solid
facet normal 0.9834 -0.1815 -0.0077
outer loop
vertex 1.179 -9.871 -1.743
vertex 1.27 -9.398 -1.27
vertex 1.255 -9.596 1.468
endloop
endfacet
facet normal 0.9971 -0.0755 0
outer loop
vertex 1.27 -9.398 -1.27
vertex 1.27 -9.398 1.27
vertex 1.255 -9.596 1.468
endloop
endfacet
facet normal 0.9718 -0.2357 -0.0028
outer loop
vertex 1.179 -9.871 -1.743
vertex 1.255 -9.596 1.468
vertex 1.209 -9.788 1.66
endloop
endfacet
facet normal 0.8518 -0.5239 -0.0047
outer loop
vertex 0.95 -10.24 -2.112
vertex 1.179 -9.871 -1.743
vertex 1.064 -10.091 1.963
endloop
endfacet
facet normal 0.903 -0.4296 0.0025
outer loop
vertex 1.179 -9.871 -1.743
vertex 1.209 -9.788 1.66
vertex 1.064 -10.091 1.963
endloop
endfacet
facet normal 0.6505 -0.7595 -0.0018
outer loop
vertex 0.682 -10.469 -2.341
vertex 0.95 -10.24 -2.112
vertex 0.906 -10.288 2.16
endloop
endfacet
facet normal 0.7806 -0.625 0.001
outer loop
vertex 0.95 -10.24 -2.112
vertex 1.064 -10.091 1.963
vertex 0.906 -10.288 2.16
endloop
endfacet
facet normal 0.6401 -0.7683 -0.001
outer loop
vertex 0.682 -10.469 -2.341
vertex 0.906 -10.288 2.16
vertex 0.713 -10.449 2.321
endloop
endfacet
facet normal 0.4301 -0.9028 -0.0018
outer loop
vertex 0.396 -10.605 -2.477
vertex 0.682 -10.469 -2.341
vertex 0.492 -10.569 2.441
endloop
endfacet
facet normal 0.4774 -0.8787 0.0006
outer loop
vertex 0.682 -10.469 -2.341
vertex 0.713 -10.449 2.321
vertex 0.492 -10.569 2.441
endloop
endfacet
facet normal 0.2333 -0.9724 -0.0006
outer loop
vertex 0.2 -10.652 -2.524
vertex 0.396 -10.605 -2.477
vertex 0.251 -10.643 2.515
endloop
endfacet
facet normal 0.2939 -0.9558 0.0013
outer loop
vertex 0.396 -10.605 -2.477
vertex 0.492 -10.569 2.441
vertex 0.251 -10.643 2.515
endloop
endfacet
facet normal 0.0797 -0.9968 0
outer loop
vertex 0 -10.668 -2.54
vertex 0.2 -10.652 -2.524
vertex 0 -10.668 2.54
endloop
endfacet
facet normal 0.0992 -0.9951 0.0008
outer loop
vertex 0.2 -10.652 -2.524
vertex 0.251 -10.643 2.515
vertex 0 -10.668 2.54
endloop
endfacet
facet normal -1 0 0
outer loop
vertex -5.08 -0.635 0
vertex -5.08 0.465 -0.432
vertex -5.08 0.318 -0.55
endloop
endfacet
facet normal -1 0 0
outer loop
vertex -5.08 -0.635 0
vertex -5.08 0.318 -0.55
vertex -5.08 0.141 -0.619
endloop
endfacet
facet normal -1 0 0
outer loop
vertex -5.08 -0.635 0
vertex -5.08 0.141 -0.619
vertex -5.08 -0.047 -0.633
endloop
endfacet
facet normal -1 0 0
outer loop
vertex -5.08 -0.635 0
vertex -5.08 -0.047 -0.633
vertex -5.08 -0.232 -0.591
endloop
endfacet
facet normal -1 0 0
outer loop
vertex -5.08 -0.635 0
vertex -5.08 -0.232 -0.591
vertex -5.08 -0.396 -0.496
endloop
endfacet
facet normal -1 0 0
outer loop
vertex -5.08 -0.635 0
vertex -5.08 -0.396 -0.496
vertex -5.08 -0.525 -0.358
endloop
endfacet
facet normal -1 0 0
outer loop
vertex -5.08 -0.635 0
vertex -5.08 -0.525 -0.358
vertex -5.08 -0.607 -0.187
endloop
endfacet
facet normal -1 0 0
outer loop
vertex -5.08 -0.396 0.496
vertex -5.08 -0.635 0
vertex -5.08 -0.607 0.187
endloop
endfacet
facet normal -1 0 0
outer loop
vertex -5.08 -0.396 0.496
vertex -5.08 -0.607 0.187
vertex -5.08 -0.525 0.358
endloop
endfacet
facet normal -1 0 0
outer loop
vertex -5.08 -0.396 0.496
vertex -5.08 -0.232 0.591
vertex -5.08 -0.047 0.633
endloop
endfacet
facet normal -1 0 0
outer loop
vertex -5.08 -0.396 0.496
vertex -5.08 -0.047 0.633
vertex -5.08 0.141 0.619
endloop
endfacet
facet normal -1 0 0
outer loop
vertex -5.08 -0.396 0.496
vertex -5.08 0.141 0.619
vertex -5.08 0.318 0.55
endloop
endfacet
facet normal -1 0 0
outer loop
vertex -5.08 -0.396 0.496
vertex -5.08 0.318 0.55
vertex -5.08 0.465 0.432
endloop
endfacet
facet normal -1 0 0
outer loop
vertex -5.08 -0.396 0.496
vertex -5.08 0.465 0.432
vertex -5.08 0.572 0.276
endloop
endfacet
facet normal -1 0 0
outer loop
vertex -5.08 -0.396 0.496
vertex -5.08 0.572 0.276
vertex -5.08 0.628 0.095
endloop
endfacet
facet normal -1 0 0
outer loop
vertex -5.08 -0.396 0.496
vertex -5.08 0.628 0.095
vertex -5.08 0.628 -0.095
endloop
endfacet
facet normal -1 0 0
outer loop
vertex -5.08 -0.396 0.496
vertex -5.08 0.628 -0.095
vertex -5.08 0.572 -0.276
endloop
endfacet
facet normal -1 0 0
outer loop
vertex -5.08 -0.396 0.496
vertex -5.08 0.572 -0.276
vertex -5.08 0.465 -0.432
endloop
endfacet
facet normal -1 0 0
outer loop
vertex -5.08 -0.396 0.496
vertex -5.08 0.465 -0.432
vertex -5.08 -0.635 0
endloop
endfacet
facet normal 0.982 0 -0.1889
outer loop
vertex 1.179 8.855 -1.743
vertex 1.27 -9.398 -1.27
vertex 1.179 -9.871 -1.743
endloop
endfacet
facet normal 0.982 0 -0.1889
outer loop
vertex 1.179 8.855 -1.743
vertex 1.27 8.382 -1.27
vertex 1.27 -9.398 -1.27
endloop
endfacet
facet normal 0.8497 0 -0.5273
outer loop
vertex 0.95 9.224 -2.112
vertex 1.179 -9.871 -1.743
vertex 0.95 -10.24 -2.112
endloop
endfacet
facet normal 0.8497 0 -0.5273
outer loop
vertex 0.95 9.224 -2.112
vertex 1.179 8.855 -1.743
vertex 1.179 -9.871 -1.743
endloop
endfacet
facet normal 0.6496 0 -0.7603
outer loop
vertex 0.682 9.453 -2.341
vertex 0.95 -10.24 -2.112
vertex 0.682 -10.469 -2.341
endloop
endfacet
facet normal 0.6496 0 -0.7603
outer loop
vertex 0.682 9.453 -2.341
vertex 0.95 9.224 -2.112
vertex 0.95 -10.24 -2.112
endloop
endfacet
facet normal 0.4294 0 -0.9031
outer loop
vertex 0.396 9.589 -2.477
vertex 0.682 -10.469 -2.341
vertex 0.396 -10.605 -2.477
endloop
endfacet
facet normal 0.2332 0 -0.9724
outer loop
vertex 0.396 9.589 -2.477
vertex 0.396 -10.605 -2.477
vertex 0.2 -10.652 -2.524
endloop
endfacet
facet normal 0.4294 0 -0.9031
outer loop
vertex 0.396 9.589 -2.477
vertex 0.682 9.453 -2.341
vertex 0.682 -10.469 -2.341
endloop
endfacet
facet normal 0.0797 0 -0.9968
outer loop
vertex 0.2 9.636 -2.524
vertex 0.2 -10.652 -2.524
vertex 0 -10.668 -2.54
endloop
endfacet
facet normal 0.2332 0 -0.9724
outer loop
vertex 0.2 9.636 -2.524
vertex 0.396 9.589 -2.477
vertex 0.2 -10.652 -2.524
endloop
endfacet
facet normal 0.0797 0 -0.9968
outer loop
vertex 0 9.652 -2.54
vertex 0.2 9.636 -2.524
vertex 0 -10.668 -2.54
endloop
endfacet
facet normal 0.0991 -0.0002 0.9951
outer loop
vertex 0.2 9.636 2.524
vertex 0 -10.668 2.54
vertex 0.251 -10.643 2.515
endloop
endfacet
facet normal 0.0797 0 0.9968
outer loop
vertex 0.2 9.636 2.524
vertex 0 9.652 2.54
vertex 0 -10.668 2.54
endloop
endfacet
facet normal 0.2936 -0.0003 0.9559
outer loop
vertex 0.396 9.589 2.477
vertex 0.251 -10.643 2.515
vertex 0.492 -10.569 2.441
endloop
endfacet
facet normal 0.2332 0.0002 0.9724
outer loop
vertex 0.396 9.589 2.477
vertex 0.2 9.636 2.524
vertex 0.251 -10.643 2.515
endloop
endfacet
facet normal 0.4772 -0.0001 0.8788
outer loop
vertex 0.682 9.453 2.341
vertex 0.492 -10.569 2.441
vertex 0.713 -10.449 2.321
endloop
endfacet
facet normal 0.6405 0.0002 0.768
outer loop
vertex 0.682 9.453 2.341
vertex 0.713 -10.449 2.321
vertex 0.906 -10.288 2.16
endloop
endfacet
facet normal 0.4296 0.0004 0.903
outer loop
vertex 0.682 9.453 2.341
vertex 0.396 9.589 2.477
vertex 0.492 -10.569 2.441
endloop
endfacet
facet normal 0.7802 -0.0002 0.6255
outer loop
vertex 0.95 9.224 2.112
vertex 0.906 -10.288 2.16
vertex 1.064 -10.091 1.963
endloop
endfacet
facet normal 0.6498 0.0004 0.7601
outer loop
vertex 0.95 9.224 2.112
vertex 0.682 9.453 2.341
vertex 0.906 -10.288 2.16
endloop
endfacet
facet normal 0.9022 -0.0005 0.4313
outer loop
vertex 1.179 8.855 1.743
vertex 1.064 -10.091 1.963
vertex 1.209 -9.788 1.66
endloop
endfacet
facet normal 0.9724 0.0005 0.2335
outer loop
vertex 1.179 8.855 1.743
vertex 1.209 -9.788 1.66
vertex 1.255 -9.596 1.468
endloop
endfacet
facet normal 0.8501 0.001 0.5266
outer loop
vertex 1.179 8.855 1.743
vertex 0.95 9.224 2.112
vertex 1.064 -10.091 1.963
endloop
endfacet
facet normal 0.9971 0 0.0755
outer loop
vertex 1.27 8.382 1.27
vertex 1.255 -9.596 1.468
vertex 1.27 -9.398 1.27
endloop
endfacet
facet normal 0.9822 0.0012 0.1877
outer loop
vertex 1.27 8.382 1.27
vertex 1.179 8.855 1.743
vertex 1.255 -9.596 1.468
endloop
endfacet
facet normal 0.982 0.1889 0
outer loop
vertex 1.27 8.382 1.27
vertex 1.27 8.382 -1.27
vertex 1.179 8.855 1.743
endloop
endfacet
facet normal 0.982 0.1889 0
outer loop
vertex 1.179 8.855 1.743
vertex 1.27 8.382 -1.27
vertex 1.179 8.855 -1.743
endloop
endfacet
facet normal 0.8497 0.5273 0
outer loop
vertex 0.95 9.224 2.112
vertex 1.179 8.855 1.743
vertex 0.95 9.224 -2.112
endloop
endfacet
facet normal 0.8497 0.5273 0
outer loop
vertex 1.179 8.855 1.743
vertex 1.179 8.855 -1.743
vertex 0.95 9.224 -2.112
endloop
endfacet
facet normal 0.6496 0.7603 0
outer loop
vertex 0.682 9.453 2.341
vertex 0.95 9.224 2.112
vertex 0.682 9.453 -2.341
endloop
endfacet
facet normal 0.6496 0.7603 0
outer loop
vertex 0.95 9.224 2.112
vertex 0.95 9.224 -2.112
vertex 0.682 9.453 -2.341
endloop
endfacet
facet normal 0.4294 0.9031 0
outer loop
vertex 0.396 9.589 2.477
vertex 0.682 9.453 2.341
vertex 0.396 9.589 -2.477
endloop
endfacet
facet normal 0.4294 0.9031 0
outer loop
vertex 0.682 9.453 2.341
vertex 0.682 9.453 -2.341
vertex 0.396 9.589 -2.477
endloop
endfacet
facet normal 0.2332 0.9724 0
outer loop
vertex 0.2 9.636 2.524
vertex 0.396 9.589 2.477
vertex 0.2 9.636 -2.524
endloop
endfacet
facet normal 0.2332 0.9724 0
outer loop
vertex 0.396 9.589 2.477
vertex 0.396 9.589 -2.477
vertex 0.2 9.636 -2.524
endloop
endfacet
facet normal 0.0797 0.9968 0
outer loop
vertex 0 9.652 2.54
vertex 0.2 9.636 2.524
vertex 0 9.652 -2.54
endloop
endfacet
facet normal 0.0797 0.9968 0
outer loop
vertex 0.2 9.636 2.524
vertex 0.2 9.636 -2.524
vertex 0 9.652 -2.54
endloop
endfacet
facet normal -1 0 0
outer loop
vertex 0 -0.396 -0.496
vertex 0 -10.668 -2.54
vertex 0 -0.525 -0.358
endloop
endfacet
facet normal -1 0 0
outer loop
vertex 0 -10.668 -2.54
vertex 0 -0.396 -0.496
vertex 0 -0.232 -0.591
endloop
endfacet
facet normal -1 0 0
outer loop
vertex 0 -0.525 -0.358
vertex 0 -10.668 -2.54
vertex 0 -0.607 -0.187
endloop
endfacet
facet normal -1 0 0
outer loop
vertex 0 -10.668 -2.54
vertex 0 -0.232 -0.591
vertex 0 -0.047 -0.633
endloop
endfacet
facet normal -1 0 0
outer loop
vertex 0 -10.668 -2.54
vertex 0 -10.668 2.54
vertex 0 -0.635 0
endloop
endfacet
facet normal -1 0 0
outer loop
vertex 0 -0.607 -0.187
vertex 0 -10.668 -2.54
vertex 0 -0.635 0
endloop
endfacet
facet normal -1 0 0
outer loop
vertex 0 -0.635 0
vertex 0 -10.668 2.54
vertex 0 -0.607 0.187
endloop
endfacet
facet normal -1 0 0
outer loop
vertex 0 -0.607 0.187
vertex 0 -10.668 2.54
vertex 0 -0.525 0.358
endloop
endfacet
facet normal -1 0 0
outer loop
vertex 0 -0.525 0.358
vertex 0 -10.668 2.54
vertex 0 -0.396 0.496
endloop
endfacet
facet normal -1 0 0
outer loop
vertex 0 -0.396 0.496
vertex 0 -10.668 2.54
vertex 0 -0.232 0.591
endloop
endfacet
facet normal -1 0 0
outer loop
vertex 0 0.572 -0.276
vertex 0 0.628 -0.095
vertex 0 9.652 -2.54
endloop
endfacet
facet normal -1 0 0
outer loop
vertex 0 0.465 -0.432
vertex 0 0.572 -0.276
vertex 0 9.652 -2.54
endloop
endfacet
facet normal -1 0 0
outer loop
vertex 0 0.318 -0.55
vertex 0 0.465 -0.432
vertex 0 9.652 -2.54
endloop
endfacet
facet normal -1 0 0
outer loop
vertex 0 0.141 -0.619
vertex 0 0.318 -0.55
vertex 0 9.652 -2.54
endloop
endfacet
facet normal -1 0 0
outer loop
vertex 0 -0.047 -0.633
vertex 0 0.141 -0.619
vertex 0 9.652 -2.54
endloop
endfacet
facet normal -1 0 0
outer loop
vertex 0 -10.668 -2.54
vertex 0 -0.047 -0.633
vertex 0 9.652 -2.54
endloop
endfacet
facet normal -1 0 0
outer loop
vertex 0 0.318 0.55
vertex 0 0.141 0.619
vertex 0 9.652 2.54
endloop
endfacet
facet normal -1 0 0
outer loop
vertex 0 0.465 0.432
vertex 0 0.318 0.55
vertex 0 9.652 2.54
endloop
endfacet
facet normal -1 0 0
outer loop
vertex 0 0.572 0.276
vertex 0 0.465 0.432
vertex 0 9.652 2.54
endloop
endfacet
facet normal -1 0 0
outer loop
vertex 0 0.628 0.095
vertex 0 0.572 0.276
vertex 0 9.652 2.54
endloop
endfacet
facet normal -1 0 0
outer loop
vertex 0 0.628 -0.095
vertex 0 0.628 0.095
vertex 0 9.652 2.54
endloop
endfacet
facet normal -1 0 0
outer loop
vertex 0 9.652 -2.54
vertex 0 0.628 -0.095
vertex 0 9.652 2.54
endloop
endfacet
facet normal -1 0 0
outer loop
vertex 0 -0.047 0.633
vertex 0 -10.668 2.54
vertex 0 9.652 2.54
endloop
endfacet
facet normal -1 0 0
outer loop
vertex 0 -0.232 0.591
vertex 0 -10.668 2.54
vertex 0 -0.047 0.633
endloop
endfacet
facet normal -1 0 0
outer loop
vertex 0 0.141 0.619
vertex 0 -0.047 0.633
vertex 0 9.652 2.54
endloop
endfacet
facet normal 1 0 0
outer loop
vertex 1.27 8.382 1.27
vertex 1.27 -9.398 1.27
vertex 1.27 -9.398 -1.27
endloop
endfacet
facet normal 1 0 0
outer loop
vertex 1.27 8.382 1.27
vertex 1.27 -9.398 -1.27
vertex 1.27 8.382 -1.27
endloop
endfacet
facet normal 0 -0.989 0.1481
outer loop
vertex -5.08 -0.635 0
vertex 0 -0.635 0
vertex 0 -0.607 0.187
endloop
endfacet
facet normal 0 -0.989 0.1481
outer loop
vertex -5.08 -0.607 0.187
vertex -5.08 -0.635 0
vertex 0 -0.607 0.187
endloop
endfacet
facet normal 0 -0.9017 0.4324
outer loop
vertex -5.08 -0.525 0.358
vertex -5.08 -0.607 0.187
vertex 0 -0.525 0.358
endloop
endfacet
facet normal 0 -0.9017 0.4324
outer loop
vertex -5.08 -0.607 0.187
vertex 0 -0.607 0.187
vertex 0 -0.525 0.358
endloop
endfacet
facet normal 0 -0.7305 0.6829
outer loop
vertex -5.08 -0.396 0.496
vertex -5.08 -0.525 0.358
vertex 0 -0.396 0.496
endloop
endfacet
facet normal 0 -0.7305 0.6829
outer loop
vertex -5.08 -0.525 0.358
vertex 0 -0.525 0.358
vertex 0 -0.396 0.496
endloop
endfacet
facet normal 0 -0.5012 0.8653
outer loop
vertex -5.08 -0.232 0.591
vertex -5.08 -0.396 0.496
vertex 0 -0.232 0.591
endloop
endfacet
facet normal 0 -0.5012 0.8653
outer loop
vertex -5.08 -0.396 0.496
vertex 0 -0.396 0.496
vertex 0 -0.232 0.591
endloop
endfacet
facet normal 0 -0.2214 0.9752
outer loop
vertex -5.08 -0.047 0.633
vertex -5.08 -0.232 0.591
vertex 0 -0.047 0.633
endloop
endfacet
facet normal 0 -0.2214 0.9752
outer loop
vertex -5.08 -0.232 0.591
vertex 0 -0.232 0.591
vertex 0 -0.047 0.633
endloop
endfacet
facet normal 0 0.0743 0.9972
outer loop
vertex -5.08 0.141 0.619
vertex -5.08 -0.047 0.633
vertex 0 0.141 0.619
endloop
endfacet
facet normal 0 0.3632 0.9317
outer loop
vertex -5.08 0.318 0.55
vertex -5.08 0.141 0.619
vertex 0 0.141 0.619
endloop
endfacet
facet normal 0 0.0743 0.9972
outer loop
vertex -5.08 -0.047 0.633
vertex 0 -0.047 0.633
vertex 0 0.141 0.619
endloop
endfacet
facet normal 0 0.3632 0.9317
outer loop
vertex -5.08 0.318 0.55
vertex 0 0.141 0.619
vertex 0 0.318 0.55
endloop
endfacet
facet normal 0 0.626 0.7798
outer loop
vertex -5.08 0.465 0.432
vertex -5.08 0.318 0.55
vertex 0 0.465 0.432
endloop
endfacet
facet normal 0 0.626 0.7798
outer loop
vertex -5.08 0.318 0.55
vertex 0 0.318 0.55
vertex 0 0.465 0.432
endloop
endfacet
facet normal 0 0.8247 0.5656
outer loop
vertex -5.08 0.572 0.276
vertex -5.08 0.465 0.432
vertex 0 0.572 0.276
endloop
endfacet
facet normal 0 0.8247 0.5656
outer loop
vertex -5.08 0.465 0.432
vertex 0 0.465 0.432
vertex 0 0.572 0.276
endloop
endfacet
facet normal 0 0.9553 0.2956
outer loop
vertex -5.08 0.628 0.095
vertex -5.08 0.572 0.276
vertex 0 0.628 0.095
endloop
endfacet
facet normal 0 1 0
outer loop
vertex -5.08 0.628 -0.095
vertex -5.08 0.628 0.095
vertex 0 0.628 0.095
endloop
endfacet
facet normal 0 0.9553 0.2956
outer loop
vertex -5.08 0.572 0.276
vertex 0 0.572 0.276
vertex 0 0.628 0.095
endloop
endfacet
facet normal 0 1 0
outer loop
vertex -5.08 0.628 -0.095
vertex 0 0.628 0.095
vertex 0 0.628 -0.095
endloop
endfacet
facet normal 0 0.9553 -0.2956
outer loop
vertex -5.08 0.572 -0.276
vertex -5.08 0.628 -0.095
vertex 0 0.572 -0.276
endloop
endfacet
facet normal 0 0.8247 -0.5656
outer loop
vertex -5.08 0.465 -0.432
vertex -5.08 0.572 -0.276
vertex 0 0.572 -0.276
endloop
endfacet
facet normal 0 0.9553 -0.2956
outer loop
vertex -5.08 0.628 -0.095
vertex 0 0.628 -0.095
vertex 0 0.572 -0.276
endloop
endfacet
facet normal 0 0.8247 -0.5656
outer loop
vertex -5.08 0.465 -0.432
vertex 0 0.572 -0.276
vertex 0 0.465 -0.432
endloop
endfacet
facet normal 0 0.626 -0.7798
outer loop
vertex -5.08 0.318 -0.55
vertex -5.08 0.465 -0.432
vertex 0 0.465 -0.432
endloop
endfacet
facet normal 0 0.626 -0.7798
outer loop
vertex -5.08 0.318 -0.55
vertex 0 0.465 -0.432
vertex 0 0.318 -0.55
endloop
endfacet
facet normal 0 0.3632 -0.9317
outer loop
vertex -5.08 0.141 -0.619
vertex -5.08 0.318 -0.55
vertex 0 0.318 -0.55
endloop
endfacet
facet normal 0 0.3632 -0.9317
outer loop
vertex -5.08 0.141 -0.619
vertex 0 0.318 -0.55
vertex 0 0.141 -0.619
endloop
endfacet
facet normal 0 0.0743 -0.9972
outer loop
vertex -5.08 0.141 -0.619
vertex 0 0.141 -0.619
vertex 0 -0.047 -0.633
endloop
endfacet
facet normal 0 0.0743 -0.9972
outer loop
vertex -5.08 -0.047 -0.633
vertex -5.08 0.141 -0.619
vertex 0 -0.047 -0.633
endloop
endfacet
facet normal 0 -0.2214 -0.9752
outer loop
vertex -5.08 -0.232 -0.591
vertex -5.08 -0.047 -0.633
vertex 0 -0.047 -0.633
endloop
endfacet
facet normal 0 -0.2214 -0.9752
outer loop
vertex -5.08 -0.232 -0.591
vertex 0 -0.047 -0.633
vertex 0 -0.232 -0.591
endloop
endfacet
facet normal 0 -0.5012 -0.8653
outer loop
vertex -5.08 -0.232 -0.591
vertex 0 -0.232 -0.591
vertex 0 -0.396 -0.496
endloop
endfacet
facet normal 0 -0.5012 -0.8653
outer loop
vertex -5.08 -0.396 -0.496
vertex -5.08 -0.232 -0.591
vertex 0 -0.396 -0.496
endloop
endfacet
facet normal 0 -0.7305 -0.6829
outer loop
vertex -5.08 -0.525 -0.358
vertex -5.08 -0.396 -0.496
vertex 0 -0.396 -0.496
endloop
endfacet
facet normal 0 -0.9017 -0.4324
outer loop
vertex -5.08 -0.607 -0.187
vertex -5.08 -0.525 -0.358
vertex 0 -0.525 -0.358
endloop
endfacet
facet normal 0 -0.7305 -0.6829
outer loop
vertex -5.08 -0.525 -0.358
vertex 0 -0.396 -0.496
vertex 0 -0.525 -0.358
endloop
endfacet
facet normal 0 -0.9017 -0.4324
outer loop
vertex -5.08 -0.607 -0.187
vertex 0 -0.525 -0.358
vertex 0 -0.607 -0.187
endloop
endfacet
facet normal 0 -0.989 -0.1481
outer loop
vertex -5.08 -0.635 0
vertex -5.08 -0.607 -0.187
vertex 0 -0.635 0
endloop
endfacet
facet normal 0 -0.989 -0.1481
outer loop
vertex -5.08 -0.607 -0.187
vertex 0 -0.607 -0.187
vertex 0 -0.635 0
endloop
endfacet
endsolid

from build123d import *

# Parameters (mm, degrees)
F0_W          = 1.27
F0_H          = 20.32
F1_DEPTH      = 2.54
F1_DEPTH_BACK = 2.54
F2_R          = 1.26999
F3_R          = 0.635
F4_DEPTH      = 5.08


# Not quite as in the source:
# - a fillet or chamfer is up to 0.001 mm smaller than in the source, because OpenCascade refuses the exact size


with BuildPart() as f1:
    # F0 (on Top) → F1 (new body, two sides)
    with BuildSketch(Plane.XY) as f1_sk:
        with Locations((0.635, -0.508000601)):
            Rectangle(F0_W, F0_H)
    extrude(amount=F1_DEPTH)
    extrude(f1_sk.sketch, amount=-F1_DEPTH_BACK)

    # F2 (radius 1.27 in the source; OpenCascade refuses exactly that, so slightly less here)
    f2_edges = [f1.edges().sort_by_distance(p)[0] for p in [
        (1.27, 9.651999, 0),
        (1.27, -0.508001, 2.54),
        (1.27, -0.508001, -2.54),
        (1.27, -10.668001, 0),
    ]]
    fillet(f2_edges, radius=F2_R)

    # F3 (on face) → F4 (join)
    with BuildSketch(Plane(origin=(0, 0, 0), x_dir=(0, -1, 0), z_dir=(-1, 0, 0))):
        Circle(F3_R)
    extrude(amount=F4_DEPTH)


solid = f1.part
